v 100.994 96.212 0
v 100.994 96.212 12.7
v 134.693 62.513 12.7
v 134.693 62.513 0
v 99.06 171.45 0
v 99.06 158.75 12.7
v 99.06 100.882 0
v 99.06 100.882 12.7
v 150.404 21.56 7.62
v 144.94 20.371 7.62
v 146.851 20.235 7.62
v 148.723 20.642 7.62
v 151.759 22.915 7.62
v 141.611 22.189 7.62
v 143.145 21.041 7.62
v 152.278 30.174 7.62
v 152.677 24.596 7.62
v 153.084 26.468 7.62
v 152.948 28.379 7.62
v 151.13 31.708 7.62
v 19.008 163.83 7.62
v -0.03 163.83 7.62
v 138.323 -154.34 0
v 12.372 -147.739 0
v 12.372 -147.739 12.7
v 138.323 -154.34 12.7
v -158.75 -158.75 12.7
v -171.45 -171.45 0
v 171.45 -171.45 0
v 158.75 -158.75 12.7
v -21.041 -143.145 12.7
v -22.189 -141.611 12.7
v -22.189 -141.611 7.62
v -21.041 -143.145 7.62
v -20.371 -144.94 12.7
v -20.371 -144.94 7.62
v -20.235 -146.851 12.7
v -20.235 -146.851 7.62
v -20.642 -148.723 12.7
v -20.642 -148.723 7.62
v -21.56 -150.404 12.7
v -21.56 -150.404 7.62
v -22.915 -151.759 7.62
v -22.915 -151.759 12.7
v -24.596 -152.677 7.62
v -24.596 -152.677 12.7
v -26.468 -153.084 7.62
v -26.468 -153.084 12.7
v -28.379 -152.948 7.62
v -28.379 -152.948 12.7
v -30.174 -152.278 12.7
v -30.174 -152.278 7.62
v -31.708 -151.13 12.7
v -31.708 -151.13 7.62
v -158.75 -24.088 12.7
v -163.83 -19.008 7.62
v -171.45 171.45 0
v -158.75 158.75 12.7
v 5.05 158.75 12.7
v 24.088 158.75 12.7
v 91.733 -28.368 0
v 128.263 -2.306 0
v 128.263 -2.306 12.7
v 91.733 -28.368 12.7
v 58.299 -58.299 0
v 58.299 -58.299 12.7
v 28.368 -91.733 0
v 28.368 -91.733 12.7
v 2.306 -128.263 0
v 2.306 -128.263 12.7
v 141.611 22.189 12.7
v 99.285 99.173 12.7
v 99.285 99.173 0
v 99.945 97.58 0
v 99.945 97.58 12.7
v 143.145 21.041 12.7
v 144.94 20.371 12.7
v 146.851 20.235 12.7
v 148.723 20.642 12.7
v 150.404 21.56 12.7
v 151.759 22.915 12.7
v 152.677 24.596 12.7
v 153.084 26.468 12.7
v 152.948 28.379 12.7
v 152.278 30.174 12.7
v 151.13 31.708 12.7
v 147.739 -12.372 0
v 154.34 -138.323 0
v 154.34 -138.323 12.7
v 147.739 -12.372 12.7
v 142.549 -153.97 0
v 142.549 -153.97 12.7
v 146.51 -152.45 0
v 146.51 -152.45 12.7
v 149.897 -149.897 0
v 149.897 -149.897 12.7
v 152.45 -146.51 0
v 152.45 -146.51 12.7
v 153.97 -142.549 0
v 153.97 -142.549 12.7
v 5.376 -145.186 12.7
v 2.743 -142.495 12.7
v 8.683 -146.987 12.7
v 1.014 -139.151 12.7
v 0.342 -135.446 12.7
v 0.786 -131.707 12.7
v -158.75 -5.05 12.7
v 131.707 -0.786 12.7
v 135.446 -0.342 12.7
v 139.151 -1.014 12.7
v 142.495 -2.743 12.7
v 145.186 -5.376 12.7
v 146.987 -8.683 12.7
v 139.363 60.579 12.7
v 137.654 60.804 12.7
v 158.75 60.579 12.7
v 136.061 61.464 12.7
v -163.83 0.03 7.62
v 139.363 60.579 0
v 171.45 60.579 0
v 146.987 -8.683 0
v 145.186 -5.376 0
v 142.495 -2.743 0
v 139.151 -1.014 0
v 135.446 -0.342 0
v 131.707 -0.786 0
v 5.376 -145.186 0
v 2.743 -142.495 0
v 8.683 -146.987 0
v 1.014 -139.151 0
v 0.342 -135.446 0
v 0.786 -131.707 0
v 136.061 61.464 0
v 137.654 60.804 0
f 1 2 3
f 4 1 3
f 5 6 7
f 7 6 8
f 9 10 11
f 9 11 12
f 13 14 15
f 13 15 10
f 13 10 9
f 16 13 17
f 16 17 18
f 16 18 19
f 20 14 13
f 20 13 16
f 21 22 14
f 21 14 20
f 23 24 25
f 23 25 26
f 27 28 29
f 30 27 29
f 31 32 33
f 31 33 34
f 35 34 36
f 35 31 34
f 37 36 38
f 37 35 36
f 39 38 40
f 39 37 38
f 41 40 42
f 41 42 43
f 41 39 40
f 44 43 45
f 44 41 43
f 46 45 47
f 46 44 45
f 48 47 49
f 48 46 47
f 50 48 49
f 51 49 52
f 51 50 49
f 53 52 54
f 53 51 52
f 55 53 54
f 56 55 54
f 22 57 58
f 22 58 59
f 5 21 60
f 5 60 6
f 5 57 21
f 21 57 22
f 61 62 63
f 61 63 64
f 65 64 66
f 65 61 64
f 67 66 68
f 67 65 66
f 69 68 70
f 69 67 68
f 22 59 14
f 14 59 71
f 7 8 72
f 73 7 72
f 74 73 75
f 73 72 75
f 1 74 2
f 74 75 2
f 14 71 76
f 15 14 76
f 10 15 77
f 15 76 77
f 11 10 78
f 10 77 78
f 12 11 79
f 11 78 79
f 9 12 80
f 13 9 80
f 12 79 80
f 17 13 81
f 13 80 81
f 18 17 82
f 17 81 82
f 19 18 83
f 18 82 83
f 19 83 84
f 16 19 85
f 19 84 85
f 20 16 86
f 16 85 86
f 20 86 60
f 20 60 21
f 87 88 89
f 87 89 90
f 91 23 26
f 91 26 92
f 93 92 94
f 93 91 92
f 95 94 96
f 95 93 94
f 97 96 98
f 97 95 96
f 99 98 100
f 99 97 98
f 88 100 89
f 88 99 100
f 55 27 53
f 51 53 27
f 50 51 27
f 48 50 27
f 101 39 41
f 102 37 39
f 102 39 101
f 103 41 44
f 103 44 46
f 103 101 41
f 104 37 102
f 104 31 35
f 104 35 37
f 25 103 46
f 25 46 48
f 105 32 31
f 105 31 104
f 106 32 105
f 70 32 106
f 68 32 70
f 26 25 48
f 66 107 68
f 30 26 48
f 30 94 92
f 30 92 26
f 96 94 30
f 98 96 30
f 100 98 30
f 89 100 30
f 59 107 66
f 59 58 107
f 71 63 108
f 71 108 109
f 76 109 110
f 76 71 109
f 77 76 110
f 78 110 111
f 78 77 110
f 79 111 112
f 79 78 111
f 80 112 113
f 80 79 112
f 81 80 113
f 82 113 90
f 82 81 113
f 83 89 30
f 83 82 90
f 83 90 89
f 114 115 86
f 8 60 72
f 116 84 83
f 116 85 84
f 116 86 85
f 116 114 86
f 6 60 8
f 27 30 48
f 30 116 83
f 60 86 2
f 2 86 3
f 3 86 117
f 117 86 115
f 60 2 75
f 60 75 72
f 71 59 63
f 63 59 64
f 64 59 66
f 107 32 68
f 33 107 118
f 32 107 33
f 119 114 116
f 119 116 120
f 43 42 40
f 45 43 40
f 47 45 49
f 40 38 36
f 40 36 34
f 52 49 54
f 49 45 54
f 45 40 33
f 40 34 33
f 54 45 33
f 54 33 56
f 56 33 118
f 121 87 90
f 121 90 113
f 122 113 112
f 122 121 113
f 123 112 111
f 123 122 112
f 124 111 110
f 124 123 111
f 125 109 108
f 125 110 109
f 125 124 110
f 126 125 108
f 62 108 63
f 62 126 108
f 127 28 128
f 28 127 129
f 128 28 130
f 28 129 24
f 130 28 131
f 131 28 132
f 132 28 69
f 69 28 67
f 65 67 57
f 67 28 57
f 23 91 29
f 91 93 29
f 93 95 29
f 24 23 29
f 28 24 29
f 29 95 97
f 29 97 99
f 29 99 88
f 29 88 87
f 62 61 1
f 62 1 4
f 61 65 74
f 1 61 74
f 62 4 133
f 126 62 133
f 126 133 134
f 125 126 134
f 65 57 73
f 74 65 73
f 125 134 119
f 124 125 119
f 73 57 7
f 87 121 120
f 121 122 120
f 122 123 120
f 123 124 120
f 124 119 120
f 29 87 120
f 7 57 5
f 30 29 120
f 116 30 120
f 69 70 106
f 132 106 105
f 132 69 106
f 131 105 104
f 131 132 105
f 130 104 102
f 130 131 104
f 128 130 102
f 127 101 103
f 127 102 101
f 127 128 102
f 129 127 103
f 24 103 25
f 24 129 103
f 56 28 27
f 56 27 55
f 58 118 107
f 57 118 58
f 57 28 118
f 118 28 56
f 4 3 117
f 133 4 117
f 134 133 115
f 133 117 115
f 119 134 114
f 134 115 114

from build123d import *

# Parameters (mm, degrees)
SKETCH2_W           = 342.9
SKETCH2_H           = 342.9
BOSS_EXTRUDE2_DEPTH = 12.7
DRAFT2_ANGLE        = -45
CUT_EXTRUDE1_DEPTH  = 5.08
CUT_EXTRUDE2_DEPTH  = 243.799289538
CUT_EXTRUDE3_DEPTH  = 243.799289538


with BuildPart() as part:
    # Sketch2 → Boss-Extrude2 (new body)
    with BuildSketch(Plane.XY):
        Rectangle(SKETCH2_W, SKETCH2_H)
    extrude(amount=BOSS_EXTRUDE2_DEPTH)

    # Draft2
    draft2_faces = [part.faces().sort_by_distance(p)[0] for p in [
        (-171.45, 0, 6.35),
        (0, -171.45, 6.35),
        (171.45, 0, 6.35),
        (0, 171.45, 6.35),
    ]]
    draft(draft2_faces, Plane(origin=(0, 0, 0), x_dir=(-1, 0, 0), z_dir=(0, 0, -1)), DRAFT2_ANGLE)

    # Sketch3 → Cut-Extrude1 (cut)
    with BuildSketch(Plane.XY.offset(12.7)):
        with BuildLine():
            Line((-171.45, 7.650128352), (-22.188943137, -141.610928512))
            ThreePointArc((-22.188943137, -141.610928512), (-22.188943137, -151.13), (-31.708014625, -151.13))
            Line((-31.708014625, -151.13), (-171.45, -11.388014625))
            Line((-171.45, -11.388014625), (-171.45, 7.650128352))
        make_face()
        with BuildLine():
            Line((11.388014625, 171.45), (-7.650128352, 171.45))
            Line((-7.650128352, 171.45), (141.610928512, 22.188943137))
            ThreePointArc((141.610928512, 22.188943137), (151.13, 22.188943137), (151.13, 31.708014625))
            Line((151.13, 31.708014625), (11.388014625, 171.45))
        make_face()
    extrude(amount=-CUT_EXTRUDE1_DEPTH, mode=Mode.SUBTRACT)

    # Sketch4 → Cut-Extrude2 (cut, through all)
    with BuildSketch(Plane.XY.offset(12.7)):
        with BuildLine():
            Line((99.06, 171.45), (99.06, 100.881890785))
            ThreePointArc((99.06, 100.881890785), (99.562699567, 98.354649397), (100.994266817, 96.212157602))
            Line((100.994266817, 96.212157602), (134.693157602, 62.513266817))
            ThreePointArc((134.693157602, 62.513266817), (136.835649397, 61.081699567), (139.362890785, 60.579))
            Line((139.362890785, 60.579), (171.45, 60.579))
            Line((171.45, 60.579), (171.45, 171.45))
            Line((171.45, 171.45), (99.06, 171.45))
        make_face()
    extrude(amount=-CUT_EXTRUDE2_DEPTH, mode=Mode.SUBTRACT)

    # Sketch5 → Cut-Extrude3 (cut, through all)
    with BuildSketch(Plane(origin=(0, 0, 0), x_dir=(-1, 0, 0), z_dir=(0, 0, -1))):
        with BuildLine():
            Line((-154.340192074, -138.323477991), (-147.739346277, -12.371837087))
            ThreePointArc((-147.739346277, -12.371837087), (-140.887450687, -1.754086289), (-128.2628732, -2.30648873))
            ThreePointArc((-128.2628732, -2.30648873), (-58.298772875, -58.298772875), (-2.30648873, -128.2628732))
            ThreePointArc((-2.30648873, -128.2628732), (-1.754086289, -140.887450687), (-12.371837087, -147.739346277))
            Line((-12.371837087, -147.739346277), (-138.323477991, -154.340192074))
            ThreePointArc((-138.323477991, -154.340192074), (-149.897385309, -149.897385309), (-154.340192074, -138.323477991))
        make_face()
    extrude(amount=-CUT_EXTRUDE3_DEPTH, mode=Mode.SUBTRACT)


solid = part.part
